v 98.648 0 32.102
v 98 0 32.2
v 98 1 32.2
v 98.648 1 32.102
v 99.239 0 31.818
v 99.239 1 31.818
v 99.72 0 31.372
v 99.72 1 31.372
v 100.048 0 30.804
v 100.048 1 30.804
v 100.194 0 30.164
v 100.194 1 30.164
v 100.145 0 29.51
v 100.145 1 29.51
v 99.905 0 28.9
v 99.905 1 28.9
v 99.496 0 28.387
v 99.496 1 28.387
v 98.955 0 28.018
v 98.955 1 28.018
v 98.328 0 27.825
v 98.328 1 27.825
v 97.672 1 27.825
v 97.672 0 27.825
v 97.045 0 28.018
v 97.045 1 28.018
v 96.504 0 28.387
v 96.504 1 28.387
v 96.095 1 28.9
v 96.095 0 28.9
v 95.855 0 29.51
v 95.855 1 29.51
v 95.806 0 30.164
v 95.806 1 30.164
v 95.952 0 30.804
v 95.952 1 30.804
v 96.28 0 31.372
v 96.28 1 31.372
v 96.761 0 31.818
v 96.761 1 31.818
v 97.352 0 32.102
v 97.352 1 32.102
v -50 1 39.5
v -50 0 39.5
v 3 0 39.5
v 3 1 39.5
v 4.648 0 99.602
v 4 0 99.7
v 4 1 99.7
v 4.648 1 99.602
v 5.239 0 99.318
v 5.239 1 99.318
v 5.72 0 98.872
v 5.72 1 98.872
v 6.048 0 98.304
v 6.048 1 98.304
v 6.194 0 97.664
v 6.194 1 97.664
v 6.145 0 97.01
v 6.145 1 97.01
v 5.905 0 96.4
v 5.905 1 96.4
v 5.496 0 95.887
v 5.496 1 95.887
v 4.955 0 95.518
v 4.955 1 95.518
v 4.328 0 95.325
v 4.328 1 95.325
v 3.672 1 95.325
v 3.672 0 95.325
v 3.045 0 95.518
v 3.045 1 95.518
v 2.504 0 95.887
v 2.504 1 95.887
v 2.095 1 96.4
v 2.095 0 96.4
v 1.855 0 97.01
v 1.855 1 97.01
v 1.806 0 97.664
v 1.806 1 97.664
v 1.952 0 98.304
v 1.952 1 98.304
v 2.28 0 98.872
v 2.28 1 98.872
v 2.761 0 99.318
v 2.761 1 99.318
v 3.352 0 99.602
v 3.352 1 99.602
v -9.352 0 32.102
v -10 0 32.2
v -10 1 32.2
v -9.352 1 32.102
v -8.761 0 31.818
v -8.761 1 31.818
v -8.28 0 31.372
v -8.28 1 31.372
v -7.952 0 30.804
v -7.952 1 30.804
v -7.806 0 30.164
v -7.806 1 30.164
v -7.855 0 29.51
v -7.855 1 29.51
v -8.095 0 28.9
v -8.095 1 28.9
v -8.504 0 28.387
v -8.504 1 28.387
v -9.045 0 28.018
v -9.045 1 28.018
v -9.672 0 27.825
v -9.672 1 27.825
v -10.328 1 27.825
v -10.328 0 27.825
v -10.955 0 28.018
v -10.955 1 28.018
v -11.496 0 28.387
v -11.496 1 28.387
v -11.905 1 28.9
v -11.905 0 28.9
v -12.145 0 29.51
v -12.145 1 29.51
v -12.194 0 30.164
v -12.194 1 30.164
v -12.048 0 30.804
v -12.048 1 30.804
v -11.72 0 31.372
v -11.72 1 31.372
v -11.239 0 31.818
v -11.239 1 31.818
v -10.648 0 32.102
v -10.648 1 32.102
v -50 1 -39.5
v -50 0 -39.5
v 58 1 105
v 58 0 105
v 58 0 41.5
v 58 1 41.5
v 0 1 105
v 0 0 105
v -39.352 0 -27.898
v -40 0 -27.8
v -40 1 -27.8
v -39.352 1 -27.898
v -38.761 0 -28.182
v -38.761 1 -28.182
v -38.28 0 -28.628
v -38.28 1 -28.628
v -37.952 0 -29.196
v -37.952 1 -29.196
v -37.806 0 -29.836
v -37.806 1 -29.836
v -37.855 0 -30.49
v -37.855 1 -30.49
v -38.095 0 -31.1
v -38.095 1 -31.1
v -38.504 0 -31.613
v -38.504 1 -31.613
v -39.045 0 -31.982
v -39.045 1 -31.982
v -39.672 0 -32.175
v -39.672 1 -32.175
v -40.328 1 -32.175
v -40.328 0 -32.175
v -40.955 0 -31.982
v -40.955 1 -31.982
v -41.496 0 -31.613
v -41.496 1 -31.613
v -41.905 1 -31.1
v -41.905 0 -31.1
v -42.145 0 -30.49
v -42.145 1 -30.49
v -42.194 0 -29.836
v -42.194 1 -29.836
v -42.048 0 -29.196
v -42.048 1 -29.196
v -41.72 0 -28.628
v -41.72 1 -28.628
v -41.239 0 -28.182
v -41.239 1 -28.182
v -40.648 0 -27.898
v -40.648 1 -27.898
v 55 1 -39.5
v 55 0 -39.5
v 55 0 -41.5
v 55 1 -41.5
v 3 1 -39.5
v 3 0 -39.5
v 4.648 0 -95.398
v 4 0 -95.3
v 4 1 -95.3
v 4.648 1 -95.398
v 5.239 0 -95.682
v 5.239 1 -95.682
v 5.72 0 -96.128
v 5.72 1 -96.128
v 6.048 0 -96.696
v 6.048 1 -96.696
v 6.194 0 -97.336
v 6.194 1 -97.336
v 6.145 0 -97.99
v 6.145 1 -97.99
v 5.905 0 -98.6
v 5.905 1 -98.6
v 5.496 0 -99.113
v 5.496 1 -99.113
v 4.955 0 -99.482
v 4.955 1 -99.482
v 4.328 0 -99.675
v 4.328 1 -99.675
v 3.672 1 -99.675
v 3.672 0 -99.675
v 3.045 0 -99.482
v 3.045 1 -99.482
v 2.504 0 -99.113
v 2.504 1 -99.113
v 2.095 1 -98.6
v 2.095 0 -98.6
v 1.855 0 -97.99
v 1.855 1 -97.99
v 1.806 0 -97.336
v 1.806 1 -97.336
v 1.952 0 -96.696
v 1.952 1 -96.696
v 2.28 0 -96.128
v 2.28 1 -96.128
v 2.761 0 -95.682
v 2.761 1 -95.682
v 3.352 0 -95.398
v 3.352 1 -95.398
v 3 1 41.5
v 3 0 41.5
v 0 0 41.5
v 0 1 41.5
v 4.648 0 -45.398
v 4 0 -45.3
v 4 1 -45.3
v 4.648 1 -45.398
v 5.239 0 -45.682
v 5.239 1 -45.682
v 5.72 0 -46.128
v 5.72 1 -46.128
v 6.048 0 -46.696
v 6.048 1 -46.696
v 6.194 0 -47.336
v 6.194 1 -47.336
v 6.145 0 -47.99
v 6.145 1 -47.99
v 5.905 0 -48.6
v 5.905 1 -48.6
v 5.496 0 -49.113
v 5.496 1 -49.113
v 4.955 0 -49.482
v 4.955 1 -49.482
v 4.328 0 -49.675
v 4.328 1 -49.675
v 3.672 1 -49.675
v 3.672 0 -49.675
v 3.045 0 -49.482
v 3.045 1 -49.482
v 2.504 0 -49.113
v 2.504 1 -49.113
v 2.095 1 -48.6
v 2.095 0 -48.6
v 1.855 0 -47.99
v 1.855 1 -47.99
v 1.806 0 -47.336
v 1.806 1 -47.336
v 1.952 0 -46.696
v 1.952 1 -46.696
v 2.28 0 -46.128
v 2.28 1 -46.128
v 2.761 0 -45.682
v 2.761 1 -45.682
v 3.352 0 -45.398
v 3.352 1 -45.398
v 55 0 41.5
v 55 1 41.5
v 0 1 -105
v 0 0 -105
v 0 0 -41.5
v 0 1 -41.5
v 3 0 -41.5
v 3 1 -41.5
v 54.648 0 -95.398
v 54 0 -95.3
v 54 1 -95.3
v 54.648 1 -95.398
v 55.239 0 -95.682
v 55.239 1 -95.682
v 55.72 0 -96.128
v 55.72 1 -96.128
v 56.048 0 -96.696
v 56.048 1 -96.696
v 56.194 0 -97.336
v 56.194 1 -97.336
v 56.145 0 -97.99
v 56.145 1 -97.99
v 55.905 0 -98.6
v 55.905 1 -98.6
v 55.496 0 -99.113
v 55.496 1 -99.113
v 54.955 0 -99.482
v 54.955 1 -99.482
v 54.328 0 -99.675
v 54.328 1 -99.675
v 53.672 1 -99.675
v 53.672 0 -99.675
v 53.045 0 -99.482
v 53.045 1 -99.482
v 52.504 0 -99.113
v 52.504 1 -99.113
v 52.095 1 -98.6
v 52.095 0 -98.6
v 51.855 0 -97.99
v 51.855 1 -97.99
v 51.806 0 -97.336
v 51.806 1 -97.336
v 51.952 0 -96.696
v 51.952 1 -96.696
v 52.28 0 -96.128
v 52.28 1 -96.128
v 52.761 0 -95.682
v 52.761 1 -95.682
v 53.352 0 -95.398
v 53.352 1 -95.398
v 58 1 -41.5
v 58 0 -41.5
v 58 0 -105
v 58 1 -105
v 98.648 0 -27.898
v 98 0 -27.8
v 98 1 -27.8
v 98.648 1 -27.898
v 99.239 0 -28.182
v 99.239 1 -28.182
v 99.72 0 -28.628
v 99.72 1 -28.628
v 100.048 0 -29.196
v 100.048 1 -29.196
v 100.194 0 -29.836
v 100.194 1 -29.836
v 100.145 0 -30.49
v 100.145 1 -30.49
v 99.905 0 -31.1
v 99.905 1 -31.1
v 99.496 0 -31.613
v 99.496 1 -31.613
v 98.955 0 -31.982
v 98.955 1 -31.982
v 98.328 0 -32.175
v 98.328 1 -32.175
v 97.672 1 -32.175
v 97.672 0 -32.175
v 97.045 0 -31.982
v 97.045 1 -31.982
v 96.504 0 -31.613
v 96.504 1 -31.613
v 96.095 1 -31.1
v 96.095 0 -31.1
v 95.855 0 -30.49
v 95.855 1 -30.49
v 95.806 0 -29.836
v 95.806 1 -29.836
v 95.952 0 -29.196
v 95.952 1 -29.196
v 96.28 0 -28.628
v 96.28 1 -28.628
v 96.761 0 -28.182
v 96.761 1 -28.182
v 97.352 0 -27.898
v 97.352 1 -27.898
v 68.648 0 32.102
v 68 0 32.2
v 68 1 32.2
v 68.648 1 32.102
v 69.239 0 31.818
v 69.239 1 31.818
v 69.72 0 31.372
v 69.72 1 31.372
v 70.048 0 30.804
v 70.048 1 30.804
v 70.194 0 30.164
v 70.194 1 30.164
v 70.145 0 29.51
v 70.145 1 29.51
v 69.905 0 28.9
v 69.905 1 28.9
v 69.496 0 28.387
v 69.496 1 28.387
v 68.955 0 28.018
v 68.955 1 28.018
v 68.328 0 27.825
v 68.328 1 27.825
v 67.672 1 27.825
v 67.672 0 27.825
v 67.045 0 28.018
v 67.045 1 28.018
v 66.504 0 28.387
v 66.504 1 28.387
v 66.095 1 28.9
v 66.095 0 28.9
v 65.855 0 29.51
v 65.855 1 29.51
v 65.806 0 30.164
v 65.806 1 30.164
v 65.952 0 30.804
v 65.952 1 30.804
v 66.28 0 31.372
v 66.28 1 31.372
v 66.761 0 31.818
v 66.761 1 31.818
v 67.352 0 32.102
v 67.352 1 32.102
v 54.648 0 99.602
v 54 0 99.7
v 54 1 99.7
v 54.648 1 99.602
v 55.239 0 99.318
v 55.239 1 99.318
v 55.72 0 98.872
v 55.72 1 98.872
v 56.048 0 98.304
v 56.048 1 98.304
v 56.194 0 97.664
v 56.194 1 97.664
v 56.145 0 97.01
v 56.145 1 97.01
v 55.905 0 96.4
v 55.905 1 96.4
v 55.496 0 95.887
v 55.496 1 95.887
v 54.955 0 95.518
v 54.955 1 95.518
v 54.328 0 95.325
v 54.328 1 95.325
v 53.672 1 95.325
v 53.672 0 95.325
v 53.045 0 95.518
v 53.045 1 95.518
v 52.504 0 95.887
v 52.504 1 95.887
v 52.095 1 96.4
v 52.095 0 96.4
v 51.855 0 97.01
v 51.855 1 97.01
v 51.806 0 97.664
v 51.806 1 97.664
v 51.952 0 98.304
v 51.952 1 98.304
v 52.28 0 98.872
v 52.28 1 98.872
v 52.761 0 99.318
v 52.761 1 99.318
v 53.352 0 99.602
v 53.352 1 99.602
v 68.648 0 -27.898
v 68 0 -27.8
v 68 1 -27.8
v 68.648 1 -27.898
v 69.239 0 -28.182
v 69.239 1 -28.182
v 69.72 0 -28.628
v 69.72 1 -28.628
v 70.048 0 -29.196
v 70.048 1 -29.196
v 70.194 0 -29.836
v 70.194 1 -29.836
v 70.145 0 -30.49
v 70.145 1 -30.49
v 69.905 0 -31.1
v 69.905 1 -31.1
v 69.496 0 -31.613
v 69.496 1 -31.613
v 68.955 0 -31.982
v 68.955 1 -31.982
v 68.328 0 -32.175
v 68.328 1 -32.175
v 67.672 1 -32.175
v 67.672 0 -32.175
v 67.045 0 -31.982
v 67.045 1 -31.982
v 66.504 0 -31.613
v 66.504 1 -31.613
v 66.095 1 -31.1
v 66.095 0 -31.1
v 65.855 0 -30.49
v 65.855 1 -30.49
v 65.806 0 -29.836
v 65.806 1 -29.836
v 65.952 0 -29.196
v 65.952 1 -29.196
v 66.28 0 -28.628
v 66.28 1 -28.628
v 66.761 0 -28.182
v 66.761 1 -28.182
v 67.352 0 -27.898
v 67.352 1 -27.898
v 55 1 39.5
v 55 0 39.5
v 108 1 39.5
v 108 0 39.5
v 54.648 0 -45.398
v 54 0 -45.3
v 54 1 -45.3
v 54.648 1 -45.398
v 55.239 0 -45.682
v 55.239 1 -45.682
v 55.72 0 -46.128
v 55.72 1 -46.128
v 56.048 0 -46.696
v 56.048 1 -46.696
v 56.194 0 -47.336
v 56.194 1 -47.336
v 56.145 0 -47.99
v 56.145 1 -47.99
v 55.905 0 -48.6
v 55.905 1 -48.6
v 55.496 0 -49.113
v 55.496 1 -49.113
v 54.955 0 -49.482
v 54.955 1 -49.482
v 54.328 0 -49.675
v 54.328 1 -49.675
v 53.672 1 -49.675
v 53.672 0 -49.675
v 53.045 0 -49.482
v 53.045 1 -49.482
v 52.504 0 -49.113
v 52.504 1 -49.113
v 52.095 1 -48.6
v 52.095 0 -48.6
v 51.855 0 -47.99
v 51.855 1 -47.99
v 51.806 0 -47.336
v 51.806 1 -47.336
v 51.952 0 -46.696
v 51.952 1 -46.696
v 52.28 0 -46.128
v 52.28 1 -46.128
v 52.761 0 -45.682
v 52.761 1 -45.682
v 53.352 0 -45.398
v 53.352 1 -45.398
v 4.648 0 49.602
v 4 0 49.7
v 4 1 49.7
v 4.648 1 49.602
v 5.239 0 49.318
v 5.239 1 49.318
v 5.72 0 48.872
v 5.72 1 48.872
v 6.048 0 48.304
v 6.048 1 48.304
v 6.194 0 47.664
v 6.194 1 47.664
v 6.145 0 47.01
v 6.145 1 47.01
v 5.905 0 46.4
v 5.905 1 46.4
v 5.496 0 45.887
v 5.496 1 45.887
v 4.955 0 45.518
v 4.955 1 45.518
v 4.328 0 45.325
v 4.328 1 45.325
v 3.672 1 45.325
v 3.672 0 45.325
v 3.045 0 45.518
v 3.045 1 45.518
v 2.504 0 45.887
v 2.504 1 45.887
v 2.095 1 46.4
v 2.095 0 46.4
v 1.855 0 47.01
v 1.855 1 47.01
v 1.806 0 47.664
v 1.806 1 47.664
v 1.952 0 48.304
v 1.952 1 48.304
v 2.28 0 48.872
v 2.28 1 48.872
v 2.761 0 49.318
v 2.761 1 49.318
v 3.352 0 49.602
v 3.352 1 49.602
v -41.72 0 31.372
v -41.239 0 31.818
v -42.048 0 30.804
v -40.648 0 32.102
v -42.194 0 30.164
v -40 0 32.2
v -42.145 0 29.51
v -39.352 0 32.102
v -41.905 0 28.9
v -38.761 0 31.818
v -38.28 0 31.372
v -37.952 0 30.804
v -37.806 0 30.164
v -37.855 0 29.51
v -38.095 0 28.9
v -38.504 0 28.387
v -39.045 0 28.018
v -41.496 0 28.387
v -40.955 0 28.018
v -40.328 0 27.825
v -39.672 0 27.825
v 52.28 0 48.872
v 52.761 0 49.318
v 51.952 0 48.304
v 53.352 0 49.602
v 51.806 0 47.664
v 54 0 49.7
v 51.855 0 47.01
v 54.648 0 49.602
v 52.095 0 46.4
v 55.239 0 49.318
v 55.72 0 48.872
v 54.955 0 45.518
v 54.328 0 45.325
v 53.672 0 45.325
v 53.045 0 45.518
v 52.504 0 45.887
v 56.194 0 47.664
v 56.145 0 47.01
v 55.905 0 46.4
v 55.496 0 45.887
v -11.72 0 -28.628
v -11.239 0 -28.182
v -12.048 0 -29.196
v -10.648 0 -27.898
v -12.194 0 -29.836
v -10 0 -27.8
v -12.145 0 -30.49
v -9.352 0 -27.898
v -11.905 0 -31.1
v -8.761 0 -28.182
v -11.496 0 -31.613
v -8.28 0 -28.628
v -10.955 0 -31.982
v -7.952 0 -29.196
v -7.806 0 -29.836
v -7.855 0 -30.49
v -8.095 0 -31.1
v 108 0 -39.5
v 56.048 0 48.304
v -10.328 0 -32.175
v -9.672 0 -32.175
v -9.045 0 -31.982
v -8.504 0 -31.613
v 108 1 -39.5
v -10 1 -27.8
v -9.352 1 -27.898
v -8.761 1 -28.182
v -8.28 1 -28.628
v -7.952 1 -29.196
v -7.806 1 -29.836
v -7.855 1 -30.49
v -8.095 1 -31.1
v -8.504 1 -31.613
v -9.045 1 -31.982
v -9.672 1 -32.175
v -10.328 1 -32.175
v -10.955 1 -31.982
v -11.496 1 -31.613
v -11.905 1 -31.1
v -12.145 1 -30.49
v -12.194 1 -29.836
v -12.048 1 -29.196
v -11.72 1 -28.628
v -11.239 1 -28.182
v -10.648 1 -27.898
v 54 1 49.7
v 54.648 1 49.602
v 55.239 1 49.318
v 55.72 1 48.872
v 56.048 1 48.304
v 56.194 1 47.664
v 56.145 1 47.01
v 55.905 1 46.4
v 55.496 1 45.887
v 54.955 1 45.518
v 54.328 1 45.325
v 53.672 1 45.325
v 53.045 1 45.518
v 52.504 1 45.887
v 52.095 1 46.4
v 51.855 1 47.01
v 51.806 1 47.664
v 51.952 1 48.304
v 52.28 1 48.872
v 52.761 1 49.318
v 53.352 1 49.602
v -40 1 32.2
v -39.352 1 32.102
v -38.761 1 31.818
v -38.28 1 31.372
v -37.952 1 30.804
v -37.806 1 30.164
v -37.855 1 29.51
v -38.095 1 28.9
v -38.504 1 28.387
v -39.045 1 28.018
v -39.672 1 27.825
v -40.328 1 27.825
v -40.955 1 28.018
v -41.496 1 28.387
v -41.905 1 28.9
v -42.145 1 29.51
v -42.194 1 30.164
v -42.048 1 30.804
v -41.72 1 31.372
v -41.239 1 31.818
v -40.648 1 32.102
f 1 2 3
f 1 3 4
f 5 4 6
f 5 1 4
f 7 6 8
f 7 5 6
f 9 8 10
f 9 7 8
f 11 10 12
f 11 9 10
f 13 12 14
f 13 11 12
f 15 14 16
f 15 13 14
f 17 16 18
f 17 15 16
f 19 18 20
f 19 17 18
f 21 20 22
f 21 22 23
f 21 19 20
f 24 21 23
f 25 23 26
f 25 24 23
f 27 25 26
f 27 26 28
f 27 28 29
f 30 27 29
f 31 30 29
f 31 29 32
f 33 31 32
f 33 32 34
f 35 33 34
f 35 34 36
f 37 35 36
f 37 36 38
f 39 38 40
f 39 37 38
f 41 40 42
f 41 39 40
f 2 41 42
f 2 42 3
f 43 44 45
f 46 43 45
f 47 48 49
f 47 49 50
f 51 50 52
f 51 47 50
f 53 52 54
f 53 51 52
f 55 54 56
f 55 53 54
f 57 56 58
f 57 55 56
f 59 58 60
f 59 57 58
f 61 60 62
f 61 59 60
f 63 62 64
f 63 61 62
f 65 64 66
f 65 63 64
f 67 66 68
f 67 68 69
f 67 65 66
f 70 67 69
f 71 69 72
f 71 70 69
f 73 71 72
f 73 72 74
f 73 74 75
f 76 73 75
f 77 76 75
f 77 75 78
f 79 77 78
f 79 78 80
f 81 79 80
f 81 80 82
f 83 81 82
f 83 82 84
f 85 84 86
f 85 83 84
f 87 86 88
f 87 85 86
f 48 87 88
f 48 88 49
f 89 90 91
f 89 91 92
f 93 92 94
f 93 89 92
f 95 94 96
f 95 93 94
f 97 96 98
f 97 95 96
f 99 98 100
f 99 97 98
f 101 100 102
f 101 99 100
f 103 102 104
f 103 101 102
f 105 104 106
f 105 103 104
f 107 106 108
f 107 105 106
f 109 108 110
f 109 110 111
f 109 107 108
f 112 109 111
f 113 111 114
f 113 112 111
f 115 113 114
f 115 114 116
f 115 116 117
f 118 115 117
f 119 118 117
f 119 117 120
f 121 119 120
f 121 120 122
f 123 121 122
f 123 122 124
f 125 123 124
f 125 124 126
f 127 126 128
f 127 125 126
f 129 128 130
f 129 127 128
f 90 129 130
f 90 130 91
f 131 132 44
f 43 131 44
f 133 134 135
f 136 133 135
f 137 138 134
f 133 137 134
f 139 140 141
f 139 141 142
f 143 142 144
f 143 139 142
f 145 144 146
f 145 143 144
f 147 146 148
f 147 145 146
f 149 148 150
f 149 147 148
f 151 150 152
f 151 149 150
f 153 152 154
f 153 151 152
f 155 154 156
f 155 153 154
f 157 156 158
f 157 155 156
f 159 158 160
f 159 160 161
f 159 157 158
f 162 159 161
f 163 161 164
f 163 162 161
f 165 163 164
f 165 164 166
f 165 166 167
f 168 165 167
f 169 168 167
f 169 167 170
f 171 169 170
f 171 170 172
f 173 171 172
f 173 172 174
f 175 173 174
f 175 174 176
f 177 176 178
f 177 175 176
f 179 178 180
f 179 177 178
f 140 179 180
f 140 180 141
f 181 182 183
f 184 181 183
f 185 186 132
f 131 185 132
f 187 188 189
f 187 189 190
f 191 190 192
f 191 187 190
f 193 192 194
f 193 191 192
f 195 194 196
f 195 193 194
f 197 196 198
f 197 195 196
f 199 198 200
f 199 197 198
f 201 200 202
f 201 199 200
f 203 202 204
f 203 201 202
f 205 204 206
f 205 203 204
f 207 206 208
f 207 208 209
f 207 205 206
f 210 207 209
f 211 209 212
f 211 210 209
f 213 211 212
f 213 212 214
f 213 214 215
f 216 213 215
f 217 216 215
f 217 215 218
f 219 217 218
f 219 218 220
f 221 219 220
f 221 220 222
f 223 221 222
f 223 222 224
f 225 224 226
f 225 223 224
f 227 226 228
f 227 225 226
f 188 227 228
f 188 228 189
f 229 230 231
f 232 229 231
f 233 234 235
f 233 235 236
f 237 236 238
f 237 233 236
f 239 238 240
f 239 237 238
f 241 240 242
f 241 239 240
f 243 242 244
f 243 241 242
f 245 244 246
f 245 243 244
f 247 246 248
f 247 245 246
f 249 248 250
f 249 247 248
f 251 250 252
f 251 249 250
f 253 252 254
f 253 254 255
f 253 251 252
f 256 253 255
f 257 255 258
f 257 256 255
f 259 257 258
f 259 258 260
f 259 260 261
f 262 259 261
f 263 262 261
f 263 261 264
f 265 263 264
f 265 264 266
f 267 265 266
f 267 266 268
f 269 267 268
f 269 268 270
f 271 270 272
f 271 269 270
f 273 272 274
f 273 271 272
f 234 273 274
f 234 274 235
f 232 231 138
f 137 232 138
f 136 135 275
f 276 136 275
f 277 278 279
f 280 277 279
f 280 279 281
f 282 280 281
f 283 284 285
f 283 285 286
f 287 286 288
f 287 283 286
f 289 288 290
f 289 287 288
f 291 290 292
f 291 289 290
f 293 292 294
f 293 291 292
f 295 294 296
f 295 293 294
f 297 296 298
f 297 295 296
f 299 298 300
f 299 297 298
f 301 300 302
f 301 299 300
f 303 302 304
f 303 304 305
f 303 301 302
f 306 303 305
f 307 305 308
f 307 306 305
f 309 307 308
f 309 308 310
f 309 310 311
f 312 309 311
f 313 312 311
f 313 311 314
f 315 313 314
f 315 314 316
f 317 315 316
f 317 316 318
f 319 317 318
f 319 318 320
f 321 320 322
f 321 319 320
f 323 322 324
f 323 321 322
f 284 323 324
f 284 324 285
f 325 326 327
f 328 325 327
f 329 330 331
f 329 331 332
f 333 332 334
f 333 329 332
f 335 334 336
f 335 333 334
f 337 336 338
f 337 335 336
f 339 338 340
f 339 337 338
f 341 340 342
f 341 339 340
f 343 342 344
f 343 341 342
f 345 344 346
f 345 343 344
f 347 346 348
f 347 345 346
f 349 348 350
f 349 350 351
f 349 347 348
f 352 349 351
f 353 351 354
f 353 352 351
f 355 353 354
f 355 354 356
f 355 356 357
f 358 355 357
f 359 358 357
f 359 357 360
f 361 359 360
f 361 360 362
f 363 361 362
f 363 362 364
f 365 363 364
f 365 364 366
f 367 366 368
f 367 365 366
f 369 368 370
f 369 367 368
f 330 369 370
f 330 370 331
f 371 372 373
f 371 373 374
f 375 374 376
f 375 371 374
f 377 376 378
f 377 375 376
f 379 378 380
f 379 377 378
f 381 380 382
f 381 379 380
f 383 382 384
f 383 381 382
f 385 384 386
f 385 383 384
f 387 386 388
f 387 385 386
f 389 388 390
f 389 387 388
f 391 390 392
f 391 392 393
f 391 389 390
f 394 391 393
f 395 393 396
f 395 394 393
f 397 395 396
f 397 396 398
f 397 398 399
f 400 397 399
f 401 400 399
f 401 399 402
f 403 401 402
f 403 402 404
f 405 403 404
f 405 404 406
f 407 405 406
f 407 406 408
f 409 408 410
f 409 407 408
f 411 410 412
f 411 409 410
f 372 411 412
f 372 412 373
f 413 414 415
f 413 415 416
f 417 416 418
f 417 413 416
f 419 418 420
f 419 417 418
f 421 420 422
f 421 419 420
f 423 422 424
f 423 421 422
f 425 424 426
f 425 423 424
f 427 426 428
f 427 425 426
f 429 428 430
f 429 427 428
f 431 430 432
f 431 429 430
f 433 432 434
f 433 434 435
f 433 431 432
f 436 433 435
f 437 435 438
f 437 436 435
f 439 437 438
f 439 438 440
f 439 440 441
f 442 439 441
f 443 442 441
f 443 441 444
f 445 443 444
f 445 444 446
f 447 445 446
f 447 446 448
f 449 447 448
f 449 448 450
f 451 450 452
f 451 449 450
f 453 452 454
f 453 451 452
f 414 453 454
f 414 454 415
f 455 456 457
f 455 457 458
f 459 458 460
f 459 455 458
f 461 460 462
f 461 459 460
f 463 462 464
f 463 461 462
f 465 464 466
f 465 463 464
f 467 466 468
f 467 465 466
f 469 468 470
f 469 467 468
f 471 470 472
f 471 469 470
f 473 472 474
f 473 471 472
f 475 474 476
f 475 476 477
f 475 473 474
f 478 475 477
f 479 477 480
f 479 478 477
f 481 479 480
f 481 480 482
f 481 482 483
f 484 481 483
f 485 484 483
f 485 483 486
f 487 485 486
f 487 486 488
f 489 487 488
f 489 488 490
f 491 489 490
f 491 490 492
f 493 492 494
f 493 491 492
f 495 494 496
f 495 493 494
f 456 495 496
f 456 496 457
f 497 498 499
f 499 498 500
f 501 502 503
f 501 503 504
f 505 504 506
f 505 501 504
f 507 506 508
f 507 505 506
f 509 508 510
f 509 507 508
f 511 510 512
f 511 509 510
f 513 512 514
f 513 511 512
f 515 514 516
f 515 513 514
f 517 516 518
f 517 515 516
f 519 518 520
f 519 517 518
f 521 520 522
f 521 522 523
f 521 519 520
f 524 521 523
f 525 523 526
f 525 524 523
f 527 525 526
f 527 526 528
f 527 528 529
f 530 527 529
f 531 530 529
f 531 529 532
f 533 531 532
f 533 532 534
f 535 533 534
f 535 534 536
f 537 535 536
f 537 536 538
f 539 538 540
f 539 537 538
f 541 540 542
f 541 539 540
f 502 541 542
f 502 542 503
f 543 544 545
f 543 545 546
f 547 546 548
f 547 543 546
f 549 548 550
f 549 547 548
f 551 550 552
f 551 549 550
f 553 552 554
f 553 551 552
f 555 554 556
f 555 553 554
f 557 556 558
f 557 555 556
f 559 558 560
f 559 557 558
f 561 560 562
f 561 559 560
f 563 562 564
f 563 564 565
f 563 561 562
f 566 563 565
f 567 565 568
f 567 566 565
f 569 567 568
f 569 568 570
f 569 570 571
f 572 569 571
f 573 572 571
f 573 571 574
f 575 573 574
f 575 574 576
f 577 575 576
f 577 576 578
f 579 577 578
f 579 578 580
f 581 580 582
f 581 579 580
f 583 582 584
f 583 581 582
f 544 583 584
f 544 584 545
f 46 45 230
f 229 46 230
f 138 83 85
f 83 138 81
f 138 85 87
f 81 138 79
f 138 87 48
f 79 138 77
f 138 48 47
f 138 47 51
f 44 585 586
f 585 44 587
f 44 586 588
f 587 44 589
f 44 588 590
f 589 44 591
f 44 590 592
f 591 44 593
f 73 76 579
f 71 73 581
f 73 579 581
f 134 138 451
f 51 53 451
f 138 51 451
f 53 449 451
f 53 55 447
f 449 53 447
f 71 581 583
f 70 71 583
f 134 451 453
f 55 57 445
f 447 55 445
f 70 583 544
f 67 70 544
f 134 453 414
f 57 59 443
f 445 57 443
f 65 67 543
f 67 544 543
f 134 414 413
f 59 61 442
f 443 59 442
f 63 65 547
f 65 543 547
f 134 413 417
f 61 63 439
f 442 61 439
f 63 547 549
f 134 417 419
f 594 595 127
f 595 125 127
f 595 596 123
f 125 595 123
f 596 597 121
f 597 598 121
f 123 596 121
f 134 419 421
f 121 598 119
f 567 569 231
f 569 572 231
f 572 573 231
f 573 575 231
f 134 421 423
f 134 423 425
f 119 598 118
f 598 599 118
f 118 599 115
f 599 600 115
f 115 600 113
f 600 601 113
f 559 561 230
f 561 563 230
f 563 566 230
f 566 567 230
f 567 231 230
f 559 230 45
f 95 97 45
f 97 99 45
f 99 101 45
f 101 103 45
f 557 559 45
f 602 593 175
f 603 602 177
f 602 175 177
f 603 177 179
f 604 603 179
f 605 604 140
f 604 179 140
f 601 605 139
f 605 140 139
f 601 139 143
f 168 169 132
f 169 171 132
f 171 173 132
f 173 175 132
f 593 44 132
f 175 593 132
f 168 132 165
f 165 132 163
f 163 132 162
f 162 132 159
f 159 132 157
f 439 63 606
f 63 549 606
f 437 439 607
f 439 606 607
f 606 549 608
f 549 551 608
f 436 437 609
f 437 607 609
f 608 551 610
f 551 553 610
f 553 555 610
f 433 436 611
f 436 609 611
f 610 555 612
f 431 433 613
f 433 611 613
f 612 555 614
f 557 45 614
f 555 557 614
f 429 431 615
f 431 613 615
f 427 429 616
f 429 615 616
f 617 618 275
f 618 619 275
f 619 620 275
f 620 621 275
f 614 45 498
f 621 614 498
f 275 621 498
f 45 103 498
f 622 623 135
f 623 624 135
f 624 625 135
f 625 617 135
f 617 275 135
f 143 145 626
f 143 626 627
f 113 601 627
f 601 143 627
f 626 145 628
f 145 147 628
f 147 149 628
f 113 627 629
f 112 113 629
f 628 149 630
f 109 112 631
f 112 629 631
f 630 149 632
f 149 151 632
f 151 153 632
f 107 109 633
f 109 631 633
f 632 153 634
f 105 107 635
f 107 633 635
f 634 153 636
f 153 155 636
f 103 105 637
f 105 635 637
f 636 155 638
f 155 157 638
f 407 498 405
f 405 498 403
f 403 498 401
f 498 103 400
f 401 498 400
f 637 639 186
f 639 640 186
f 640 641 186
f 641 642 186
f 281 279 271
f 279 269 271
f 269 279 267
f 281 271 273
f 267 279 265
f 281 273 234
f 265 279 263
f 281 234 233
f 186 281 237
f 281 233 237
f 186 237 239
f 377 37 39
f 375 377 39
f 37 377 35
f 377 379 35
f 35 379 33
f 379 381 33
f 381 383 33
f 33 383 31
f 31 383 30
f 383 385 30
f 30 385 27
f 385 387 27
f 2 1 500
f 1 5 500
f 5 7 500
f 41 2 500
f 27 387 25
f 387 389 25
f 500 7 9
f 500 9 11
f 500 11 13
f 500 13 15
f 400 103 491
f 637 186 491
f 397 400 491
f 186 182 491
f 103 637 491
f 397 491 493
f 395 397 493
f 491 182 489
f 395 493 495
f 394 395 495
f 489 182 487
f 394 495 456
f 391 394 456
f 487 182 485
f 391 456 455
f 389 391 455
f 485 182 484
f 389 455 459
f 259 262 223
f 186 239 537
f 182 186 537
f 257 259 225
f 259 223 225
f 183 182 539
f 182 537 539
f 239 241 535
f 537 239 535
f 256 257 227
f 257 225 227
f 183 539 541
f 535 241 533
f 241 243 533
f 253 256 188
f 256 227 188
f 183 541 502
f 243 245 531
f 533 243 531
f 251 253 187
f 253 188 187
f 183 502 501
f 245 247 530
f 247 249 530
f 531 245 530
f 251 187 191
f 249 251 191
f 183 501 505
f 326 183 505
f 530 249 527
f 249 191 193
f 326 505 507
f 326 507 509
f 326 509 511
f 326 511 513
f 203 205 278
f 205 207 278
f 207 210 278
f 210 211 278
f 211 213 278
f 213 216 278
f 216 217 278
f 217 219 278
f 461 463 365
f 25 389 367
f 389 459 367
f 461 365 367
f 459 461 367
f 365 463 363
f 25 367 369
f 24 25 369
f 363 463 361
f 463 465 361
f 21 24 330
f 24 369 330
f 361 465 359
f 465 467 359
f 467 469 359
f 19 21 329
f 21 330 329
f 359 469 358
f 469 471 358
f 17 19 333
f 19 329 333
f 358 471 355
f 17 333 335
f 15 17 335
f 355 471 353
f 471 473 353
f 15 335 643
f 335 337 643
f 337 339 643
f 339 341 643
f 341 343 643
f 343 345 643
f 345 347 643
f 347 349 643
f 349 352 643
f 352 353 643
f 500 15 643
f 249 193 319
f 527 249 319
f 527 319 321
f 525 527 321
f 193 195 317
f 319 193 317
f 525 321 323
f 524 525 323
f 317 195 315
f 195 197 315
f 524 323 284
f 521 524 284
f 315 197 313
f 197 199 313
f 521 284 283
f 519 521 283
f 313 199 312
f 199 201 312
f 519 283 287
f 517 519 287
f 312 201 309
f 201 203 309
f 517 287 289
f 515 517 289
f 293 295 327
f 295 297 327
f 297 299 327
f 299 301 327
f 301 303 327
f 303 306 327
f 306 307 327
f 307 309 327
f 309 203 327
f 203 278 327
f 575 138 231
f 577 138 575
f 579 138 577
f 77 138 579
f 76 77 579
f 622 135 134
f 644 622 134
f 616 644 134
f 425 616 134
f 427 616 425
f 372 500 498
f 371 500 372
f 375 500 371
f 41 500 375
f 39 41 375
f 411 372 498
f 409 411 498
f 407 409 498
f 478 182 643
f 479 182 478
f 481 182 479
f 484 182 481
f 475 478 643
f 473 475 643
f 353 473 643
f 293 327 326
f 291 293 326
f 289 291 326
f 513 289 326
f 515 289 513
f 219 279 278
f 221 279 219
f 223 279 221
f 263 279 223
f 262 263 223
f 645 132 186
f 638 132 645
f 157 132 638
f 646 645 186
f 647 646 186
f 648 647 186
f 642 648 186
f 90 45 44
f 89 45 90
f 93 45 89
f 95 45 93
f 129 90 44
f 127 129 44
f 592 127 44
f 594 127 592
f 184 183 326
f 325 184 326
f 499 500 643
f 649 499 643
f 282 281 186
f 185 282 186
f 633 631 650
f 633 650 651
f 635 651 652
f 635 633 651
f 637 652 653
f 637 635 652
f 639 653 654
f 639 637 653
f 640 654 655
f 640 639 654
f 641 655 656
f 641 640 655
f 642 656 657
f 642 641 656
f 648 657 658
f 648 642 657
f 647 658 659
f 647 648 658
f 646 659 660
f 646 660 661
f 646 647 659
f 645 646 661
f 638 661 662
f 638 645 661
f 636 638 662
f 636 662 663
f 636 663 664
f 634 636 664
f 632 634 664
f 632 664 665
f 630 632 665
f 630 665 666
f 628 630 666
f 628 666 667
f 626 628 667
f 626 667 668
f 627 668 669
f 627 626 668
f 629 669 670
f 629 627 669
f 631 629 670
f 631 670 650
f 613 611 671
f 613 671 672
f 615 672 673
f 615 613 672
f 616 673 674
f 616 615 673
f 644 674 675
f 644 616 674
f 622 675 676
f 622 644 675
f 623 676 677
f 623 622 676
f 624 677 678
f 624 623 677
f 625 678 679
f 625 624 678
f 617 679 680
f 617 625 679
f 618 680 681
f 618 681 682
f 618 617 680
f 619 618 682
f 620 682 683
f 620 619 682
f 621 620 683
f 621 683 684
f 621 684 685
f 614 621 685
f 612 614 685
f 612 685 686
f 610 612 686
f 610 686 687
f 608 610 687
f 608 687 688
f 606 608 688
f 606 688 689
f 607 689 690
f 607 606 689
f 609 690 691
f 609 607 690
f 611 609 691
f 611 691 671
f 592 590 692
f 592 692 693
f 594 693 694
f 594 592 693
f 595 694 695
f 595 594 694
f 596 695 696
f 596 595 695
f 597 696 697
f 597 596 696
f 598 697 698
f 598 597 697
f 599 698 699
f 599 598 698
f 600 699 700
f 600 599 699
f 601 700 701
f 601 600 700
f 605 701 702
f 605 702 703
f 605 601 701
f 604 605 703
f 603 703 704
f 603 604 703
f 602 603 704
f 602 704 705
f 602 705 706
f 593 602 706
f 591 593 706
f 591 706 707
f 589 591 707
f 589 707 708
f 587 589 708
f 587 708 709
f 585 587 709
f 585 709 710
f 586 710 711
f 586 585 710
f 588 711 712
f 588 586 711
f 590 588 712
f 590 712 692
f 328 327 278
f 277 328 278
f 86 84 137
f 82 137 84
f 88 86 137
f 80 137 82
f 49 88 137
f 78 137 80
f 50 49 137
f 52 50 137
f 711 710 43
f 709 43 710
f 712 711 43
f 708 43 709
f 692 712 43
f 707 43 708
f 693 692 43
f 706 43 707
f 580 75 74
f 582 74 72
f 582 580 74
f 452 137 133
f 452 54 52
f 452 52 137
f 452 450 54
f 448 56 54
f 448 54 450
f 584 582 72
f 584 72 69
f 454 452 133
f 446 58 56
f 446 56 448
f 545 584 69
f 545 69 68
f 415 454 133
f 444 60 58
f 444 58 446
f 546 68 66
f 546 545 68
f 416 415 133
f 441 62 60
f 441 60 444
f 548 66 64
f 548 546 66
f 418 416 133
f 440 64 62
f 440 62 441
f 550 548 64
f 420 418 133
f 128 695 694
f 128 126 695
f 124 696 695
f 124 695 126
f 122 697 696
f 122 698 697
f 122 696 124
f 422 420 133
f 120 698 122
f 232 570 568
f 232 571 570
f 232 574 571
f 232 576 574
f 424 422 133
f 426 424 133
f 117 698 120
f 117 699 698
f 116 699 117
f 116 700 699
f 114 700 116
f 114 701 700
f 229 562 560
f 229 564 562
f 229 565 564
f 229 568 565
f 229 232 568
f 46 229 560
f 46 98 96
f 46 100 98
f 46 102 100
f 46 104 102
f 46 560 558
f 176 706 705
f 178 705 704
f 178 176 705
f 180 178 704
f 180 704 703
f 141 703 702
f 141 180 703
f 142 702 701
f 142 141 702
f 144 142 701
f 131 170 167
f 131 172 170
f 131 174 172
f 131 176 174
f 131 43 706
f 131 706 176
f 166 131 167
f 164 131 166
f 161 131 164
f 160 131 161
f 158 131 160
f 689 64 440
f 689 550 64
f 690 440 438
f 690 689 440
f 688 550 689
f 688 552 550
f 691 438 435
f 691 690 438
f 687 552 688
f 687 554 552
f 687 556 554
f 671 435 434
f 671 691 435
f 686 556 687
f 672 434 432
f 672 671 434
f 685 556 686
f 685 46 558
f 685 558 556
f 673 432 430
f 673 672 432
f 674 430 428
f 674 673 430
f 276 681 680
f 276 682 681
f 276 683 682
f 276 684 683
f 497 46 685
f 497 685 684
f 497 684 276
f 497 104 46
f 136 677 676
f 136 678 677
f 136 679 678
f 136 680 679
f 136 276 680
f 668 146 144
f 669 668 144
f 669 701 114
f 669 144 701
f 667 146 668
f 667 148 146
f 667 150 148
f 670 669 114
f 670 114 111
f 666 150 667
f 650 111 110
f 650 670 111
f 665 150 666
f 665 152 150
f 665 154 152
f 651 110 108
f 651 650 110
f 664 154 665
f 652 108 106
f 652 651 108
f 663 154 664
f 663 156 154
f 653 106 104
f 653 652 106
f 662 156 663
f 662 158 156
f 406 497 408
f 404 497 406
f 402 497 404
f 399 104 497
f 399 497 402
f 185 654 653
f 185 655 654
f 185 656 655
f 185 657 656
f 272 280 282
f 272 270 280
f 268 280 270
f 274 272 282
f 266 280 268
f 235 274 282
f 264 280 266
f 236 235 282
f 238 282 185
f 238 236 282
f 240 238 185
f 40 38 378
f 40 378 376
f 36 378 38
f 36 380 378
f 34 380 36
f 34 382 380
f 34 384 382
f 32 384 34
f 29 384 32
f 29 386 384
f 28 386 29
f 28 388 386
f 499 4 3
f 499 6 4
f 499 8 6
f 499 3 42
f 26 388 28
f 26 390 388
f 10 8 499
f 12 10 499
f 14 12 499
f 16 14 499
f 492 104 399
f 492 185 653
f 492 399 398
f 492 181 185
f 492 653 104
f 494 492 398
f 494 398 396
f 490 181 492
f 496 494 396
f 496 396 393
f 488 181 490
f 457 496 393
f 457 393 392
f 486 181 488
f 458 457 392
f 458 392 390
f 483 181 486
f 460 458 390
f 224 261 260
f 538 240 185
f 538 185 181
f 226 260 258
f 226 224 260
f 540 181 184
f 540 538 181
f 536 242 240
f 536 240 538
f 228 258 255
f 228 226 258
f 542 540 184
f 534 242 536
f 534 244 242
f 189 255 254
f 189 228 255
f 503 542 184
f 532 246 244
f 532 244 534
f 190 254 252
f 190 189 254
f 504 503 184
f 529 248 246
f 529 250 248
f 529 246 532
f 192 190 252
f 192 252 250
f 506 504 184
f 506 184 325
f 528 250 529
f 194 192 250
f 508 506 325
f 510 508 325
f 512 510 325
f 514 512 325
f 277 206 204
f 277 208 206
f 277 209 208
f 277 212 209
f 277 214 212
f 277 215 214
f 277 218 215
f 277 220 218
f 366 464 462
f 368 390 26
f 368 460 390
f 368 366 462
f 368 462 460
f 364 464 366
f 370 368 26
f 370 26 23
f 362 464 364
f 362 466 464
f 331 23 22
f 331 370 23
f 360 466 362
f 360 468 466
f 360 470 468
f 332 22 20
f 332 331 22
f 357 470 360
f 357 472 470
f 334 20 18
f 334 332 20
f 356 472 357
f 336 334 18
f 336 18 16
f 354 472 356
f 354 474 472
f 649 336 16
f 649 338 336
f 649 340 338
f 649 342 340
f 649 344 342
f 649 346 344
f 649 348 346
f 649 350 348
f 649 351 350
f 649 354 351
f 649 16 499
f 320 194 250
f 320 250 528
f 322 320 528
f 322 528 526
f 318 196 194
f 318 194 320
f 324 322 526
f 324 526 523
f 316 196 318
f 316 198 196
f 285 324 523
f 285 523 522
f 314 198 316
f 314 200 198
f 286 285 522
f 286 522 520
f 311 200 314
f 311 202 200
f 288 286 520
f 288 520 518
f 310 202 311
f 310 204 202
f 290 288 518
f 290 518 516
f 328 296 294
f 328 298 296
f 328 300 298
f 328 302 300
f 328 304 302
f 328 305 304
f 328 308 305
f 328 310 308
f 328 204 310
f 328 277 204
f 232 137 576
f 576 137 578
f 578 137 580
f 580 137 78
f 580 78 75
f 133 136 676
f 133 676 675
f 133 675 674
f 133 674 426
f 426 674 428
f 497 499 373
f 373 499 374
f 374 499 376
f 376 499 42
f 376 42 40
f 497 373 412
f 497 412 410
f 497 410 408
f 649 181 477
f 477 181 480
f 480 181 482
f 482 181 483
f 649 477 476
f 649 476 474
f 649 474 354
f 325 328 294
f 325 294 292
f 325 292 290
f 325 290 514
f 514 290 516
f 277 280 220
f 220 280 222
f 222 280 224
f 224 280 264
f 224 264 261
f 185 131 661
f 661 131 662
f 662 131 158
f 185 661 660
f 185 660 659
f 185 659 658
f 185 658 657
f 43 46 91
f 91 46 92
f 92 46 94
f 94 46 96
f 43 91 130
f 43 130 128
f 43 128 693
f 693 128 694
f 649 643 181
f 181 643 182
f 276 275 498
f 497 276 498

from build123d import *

# Parameters (mm, degrees)
SKETCH1_R           = 2.2
BOSS_EXTRUDE1_DEPTH = 1


with BuildPart() as part:
    # Sketch1 → Boss-Extrude1 (new body)
    with BuildSketch(Plane(origin=(0, 0, 0), x_dir=(1, 0, 0), z_dir=(0, 1, 0))):
        Polygon((0, -39.5), (3, -39.5), (3, -41.5), (0, -41.5), (0, -105), (58, -105), (58, -41.5), (55, -41.5), (55, -39.5), (58, -39.5), (108, -39.5), (108, 39.5), (58, 39.5), (55, 39.5), (55, 41.5), (58, 41.5), (58, 105), (0, 105), (0, 41.5), (3, 41.5), (3, 39.5), (0, 39.5), (-50, 39.5), (-50, -39.5), align=None)
        with Locations(Location((4, 97.5, 0), (0, 0, 270))):
            Circle(SKETCH1_R, mode=Mode.SUBTRACT)
        with Locations(Location((54, 97.5, 0), (0, 0, 270))):
            Circle(SKETCH1_R, mode=Mode.SUBTRACT)
        with Locations(Location((54, 47.5, 0), (0, 0, 270))):
            Circle(SKETCH1_R, mode=Mode.SUBTRACT)
        with Locations(Location((4, 47.5, 0), (0, 0, 270))):
            Circle(SKETCH1_R, mode=Mode.SUBTRACT)
        with Locations(Location((4, -47.5, 0), (0, 0, 270))):
            Circle(SKETCH1_R, mode=Mode.SUBTRACT)
        with Locations(Location((54, -47.5, 0), (0, 0, 270))):
            Circle(SKETCH1_R, mode=Mode.SUBTRACT)
        with Locations(Location((54, -97.5, 0), (0, 0, 270))):
            Circle(SKETCH1_R, mode=Mode.SUBTRACT)
        with Locations(Location((4, -97.5, 0), (0, 0, 270))):
            Circle(SKETCH1_R, mode=Mode.SUBTRACT)
        with Locations(Location((-40, 30, 0), (0, 0, 270))):
            Circle(SKETCH1_R, mode=Mode.SUBTRACT)
        with Locations(Location((-10, 30, 0), (0, 0, 270))):
            Circle(SKETCH1_R, mode=Mode.SUBTRACT)
        with Locations(Location((-40, -30, 0), (0, 0, 270))):
            Circle(SKETCH1_R, mode=Mode.SUBTRACT)
        with Locations(Location((-10, -30, 0), (0, 0, 270))):
            Circle(SKETCH1_R, mode=Mode.SUBTRACT)
        with Locations(Location((68, -30, 0), (0, 0, 270))):
            Circle(SKETCH1_R, mode=Mode.SUBTRACT)
        with Locations(Location((98, -30, 0), (0, 0, 270))):
            Circle(SKETCH1_R, mode=Mode.SUBTRACT)
        with Locations(Location((98, 30, 0), (0, 0, 270))):
            Circle(SKETCH1_R, mode=Mode.SUBTRACT)
        with Locations(Location((68, 30, 0), (0, 0, 270))):
            Circle(SKETCH1_R, mode=Mode.SUBTRACT)
    extrude(amount=BOSS_EXTRUDE1_DEPTH)


solid = part.part
